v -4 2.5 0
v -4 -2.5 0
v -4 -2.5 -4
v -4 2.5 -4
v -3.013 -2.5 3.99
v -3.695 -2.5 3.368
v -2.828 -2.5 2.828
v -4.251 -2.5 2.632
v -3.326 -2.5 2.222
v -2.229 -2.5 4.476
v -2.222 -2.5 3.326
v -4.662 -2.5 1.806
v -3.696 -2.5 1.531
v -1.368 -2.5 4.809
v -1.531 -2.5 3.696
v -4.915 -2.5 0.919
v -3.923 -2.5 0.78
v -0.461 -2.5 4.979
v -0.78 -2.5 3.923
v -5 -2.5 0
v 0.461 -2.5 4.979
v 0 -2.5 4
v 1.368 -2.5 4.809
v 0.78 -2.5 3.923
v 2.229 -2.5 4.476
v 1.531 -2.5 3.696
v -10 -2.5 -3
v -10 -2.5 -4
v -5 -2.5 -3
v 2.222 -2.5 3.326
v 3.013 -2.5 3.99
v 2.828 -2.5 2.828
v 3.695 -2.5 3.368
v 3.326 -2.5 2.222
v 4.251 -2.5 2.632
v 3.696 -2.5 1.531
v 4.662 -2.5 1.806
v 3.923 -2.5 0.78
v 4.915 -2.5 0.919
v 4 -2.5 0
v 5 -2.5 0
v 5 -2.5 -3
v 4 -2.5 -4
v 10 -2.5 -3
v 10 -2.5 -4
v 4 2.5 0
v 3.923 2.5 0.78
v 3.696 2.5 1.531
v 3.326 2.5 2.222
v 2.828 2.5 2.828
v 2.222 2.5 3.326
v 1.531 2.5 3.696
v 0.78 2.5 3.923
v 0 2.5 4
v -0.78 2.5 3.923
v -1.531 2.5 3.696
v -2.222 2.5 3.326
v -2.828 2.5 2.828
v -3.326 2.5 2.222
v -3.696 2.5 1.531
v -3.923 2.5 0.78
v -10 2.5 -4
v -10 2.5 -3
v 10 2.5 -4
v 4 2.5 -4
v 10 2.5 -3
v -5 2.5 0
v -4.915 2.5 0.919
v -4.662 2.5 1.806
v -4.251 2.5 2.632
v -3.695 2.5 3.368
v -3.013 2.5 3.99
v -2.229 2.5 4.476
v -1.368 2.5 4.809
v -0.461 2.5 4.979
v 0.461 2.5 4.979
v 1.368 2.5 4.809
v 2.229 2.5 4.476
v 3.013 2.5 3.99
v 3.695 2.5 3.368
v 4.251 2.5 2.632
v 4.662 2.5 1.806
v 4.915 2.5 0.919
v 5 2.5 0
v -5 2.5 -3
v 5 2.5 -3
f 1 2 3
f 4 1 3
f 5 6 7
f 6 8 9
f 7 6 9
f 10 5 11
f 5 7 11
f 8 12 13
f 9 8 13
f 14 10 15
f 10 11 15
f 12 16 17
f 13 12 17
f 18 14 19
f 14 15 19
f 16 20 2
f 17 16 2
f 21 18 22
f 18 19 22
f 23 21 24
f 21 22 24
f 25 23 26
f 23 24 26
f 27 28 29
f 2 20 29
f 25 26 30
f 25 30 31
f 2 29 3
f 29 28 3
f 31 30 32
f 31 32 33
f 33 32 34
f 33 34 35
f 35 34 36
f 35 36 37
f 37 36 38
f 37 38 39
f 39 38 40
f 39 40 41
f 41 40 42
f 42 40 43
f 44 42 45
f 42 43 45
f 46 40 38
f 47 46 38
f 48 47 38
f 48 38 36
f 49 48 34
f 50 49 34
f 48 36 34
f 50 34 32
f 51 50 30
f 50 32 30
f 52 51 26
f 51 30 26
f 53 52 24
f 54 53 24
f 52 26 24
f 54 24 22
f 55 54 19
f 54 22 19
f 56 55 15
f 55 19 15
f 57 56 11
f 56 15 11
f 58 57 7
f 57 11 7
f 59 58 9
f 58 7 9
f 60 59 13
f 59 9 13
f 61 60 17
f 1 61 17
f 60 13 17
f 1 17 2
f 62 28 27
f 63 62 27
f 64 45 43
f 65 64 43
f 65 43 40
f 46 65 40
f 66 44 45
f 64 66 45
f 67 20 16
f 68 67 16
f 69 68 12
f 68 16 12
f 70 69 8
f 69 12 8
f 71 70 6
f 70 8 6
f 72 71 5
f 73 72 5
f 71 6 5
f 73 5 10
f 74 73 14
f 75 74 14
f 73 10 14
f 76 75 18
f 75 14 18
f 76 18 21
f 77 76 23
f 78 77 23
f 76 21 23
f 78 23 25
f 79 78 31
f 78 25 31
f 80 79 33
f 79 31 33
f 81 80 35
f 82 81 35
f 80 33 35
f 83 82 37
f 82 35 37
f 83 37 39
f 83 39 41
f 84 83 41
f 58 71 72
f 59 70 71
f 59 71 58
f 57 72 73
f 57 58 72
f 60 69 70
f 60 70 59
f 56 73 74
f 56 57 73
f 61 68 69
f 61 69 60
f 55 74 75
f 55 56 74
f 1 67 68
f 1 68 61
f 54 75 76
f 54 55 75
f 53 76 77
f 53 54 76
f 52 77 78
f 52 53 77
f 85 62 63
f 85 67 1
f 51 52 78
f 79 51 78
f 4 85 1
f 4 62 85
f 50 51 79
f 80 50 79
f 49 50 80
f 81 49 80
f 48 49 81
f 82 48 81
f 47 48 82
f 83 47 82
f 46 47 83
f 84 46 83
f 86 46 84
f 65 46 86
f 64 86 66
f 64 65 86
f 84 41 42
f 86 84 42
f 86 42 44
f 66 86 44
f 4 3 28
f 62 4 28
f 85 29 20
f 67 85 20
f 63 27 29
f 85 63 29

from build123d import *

# Parameters (mm, degrees)
BOSS_EXTRUDE2_DEPTH      = 2.5
BOSS_EXTRUDE2_DEPTH_BACK = 2.5


with BuildPart() as part:
    # Sketch1 → Boss-Extrude2 (new, two sides: drawn at the far end of the back side and taken through both)
    with BuildSketch(Plane(origin=(0, 0, 0), x_dir=(1, 0, 0), z_dir=(0, 1, 0)).offset(-BOSS_EXTRUDE2_DEPTH_BACK)):
        with BuildLine():
            Line((-4, 0), (-4, 4))
            Line((-4, 4), (-10, 4))
            Line((-10, 4), (-10, 3))
            Line((-10, 3), (-5, 3))
            Line((-5, 3), (-5, 0))
            ThreePointArc((-5, 0), (0, -5), (5, 0))
            Line((5, 0), (5, 3))
            Line((5, 3), (10, 3))
            Line((10, 3), (10, 4))
            Line((10, 4), (4, 4))
            Line((4, 4), (4, 0))
            ThreePointArc((4, 0), (0, -4), (-4, 0))
        make_face()
    extrude(amount=BOSS_EXTRUDE2_DEPTH + BOSS_EXTRUDE2_DEPTH_BACK)


solid = part.part
